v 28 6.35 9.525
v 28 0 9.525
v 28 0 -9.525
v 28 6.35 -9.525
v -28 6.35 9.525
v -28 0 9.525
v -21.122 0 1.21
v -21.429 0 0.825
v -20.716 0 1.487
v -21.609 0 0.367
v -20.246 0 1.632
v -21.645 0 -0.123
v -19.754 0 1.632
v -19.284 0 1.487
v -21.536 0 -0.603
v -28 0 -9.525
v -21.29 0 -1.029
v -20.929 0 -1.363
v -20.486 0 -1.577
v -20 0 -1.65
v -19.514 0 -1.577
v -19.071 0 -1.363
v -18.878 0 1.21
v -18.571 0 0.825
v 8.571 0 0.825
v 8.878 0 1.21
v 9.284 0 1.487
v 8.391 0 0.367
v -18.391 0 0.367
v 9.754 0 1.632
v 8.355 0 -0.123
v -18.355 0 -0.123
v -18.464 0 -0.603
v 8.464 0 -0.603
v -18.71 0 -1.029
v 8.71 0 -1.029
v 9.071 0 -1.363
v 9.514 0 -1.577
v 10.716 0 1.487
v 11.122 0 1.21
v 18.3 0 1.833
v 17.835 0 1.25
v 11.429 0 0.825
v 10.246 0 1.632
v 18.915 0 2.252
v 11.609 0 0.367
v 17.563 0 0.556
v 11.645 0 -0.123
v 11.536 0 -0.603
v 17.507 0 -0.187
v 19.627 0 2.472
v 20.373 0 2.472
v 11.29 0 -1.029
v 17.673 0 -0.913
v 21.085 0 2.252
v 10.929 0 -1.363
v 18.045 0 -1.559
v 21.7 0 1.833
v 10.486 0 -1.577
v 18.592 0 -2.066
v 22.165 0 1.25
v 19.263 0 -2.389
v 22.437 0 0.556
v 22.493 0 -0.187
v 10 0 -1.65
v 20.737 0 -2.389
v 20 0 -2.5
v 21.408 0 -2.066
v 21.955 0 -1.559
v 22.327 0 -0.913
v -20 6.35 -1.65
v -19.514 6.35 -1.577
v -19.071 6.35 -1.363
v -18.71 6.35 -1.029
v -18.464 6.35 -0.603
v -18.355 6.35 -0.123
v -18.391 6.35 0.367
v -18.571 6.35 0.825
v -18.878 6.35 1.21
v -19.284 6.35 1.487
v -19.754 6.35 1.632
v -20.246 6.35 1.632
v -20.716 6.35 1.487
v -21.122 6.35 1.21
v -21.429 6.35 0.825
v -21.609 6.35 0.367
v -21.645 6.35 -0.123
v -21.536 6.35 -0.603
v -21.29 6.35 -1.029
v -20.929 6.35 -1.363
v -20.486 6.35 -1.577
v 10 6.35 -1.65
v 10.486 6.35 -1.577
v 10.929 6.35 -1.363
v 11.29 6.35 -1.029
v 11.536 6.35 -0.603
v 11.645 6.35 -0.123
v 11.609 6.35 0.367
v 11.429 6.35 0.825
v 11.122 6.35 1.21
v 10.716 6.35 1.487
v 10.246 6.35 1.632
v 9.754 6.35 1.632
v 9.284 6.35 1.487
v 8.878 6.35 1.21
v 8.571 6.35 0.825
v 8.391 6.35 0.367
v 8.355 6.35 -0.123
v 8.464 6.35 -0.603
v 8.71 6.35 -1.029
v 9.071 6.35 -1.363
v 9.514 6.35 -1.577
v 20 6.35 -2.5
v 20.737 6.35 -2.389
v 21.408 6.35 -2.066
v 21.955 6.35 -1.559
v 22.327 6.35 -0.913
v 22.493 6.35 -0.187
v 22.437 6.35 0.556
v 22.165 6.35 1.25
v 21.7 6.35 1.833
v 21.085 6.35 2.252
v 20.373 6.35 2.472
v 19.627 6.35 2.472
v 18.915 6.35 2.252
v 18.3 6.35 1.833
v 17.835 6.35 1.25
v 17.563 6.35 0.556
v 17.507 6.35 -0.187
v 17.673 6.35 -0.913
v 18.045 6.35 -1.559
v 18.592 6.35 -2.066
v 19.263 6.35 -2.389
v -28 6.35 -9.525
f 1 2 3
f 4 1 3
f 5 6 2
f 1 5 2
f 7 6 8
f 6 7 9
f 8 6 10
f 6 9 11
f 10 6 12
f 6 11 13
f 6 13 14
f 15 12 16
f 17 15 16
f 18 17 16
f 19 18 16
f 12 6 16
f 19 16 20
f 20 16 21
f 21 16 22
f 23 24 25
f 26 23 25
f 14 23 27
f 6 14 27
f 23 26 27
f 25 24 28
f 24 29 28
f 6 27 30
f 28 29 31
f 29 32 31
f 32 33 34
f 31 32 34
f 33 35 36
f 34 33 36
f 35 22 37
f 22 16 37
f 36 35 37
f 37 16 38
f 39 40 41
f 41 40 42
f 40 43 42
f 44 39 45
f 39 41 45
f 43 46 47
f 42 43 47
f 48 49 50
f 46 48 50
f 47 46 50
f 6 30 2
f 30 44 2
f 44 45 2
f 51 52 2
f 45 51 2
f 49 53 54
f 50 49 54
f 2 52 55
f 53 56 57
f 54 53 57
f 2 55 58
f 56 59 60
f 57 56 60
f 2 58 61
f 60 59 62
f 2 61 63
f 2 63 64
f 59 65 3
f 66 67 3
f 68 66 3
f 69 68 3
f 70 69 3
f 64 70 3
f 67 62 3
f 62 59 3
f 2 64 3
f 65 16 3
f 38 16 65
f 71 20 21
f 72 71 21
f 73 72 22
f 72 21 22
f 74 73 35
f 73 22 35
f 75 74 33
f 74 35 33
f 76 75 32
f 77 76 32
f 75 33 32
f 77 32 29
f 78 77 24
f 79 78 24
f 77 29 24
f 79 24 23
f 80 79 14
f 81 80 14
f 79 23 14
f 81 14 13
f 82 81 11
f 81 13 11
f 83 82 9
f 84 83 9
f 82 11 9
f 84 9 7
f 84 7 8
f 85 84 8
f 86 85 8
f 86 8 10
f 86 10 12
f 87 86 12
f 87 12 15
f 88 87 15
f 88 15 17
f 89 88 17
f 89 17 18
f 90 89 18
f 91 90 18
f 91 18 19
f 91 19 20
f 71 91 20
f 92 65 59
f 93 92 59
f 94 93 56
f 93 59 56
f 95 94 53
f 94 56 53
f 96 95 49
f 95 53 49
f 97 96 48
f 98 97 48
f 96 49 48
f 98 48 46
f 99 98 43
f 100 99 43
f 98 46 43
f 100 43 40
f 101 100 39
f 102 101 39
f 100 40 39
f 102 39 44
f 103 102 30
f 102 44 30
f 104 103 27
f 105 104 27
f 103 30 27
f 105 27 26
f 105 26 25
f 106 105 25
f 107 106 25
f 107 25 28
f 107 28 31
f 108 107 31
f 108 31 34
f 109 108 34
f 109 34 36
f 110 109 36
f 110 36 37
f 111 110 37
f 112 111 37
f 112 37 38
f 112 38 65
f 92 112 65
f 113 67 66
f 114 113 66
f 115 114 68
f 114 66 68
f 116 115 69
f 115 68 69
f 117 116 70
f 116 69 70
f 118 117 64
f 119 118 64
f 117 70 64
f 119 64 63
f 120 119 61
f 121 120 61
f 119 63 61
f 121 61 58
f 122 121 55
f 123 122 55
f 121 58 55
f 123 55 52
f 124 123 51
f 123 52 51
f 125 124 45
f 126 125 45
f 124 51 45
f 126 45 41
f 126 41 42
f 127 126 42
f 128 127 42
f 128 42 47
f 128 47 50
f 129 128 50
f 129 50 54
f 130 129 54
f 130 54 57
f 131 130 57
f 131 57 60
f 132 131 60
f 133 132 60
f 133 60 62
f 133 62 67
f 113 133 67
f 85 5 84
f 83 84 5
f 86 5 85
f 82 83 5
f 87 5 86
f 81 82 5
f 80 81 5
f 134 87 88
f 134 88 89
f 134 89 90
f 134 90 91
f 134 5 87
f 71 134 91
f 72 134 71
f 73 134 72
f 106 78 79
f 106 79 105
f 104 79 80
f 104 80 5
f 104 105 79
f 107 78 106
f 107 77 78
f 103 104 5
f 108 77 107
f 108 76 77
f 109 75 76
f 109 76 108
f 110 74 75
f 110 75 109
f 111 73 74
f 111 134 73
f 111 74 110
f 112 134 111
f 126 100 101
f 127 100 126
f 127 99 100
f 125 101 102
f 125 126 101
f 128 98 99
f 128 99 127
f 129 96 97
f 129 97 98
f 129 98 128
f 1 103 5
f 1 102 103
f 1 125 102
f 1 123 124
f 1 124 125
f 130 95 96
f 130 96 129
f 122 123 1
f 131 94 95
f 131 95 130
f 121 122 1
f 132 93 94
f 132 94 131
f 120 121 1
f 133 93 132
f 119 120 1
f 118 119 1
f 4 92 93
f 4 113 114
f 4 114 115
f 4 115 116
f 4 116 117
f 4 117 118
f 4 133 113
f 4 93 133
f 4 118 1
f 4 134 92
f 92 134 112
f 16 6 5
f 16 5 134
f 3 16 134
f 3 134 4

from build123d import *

# Parameters (mm, degrees)
SKETCH1_W             = 56
SKETCH1_H             = 19.05
BOSS_EXTRUDE1_DEPTH   = 6.35
M6X1_0_TAPPED_HOLE1_D = 5
M4X0_7_TAPPED_HOLE1_D = 3.3


with BuildPart() as part:
    # Sketch1 → Boss-Extrude1 (new body)
    with BuildSketch(Plane(origin=(0, 0, 0), x_dir=(1, 0, 0), z_dir=(0, 1, 0))):
        Rectangle(SKETCH1_W, SKETCH1_H)
    extrude(amount=BOSS_EXTRUDE1_DEPTH)

    # M6x1.0 Tapped Hole1 (through all)
    with Locations(Plane(origin=(20, 6.35, 0), x_dir=(0, 0, 1), z_dir=(0, 1, 0))):
        with Locations((0, 0)):
            Hole(M6X1_0_TAPPED_HOLE1_D / 2)

    # M4x0.7 Tapped Hole1 (through all)
    with Locations(Plane(origin=(-20, 6.35, 0), x_dir=(0, 0, 1), z_dir=(0, 1, 0))):
        with Locations((0, 0), (0, 30)):
            Hole(M4X0_7_TAPPED_HOLE1_D / 2)


solid = part.part
